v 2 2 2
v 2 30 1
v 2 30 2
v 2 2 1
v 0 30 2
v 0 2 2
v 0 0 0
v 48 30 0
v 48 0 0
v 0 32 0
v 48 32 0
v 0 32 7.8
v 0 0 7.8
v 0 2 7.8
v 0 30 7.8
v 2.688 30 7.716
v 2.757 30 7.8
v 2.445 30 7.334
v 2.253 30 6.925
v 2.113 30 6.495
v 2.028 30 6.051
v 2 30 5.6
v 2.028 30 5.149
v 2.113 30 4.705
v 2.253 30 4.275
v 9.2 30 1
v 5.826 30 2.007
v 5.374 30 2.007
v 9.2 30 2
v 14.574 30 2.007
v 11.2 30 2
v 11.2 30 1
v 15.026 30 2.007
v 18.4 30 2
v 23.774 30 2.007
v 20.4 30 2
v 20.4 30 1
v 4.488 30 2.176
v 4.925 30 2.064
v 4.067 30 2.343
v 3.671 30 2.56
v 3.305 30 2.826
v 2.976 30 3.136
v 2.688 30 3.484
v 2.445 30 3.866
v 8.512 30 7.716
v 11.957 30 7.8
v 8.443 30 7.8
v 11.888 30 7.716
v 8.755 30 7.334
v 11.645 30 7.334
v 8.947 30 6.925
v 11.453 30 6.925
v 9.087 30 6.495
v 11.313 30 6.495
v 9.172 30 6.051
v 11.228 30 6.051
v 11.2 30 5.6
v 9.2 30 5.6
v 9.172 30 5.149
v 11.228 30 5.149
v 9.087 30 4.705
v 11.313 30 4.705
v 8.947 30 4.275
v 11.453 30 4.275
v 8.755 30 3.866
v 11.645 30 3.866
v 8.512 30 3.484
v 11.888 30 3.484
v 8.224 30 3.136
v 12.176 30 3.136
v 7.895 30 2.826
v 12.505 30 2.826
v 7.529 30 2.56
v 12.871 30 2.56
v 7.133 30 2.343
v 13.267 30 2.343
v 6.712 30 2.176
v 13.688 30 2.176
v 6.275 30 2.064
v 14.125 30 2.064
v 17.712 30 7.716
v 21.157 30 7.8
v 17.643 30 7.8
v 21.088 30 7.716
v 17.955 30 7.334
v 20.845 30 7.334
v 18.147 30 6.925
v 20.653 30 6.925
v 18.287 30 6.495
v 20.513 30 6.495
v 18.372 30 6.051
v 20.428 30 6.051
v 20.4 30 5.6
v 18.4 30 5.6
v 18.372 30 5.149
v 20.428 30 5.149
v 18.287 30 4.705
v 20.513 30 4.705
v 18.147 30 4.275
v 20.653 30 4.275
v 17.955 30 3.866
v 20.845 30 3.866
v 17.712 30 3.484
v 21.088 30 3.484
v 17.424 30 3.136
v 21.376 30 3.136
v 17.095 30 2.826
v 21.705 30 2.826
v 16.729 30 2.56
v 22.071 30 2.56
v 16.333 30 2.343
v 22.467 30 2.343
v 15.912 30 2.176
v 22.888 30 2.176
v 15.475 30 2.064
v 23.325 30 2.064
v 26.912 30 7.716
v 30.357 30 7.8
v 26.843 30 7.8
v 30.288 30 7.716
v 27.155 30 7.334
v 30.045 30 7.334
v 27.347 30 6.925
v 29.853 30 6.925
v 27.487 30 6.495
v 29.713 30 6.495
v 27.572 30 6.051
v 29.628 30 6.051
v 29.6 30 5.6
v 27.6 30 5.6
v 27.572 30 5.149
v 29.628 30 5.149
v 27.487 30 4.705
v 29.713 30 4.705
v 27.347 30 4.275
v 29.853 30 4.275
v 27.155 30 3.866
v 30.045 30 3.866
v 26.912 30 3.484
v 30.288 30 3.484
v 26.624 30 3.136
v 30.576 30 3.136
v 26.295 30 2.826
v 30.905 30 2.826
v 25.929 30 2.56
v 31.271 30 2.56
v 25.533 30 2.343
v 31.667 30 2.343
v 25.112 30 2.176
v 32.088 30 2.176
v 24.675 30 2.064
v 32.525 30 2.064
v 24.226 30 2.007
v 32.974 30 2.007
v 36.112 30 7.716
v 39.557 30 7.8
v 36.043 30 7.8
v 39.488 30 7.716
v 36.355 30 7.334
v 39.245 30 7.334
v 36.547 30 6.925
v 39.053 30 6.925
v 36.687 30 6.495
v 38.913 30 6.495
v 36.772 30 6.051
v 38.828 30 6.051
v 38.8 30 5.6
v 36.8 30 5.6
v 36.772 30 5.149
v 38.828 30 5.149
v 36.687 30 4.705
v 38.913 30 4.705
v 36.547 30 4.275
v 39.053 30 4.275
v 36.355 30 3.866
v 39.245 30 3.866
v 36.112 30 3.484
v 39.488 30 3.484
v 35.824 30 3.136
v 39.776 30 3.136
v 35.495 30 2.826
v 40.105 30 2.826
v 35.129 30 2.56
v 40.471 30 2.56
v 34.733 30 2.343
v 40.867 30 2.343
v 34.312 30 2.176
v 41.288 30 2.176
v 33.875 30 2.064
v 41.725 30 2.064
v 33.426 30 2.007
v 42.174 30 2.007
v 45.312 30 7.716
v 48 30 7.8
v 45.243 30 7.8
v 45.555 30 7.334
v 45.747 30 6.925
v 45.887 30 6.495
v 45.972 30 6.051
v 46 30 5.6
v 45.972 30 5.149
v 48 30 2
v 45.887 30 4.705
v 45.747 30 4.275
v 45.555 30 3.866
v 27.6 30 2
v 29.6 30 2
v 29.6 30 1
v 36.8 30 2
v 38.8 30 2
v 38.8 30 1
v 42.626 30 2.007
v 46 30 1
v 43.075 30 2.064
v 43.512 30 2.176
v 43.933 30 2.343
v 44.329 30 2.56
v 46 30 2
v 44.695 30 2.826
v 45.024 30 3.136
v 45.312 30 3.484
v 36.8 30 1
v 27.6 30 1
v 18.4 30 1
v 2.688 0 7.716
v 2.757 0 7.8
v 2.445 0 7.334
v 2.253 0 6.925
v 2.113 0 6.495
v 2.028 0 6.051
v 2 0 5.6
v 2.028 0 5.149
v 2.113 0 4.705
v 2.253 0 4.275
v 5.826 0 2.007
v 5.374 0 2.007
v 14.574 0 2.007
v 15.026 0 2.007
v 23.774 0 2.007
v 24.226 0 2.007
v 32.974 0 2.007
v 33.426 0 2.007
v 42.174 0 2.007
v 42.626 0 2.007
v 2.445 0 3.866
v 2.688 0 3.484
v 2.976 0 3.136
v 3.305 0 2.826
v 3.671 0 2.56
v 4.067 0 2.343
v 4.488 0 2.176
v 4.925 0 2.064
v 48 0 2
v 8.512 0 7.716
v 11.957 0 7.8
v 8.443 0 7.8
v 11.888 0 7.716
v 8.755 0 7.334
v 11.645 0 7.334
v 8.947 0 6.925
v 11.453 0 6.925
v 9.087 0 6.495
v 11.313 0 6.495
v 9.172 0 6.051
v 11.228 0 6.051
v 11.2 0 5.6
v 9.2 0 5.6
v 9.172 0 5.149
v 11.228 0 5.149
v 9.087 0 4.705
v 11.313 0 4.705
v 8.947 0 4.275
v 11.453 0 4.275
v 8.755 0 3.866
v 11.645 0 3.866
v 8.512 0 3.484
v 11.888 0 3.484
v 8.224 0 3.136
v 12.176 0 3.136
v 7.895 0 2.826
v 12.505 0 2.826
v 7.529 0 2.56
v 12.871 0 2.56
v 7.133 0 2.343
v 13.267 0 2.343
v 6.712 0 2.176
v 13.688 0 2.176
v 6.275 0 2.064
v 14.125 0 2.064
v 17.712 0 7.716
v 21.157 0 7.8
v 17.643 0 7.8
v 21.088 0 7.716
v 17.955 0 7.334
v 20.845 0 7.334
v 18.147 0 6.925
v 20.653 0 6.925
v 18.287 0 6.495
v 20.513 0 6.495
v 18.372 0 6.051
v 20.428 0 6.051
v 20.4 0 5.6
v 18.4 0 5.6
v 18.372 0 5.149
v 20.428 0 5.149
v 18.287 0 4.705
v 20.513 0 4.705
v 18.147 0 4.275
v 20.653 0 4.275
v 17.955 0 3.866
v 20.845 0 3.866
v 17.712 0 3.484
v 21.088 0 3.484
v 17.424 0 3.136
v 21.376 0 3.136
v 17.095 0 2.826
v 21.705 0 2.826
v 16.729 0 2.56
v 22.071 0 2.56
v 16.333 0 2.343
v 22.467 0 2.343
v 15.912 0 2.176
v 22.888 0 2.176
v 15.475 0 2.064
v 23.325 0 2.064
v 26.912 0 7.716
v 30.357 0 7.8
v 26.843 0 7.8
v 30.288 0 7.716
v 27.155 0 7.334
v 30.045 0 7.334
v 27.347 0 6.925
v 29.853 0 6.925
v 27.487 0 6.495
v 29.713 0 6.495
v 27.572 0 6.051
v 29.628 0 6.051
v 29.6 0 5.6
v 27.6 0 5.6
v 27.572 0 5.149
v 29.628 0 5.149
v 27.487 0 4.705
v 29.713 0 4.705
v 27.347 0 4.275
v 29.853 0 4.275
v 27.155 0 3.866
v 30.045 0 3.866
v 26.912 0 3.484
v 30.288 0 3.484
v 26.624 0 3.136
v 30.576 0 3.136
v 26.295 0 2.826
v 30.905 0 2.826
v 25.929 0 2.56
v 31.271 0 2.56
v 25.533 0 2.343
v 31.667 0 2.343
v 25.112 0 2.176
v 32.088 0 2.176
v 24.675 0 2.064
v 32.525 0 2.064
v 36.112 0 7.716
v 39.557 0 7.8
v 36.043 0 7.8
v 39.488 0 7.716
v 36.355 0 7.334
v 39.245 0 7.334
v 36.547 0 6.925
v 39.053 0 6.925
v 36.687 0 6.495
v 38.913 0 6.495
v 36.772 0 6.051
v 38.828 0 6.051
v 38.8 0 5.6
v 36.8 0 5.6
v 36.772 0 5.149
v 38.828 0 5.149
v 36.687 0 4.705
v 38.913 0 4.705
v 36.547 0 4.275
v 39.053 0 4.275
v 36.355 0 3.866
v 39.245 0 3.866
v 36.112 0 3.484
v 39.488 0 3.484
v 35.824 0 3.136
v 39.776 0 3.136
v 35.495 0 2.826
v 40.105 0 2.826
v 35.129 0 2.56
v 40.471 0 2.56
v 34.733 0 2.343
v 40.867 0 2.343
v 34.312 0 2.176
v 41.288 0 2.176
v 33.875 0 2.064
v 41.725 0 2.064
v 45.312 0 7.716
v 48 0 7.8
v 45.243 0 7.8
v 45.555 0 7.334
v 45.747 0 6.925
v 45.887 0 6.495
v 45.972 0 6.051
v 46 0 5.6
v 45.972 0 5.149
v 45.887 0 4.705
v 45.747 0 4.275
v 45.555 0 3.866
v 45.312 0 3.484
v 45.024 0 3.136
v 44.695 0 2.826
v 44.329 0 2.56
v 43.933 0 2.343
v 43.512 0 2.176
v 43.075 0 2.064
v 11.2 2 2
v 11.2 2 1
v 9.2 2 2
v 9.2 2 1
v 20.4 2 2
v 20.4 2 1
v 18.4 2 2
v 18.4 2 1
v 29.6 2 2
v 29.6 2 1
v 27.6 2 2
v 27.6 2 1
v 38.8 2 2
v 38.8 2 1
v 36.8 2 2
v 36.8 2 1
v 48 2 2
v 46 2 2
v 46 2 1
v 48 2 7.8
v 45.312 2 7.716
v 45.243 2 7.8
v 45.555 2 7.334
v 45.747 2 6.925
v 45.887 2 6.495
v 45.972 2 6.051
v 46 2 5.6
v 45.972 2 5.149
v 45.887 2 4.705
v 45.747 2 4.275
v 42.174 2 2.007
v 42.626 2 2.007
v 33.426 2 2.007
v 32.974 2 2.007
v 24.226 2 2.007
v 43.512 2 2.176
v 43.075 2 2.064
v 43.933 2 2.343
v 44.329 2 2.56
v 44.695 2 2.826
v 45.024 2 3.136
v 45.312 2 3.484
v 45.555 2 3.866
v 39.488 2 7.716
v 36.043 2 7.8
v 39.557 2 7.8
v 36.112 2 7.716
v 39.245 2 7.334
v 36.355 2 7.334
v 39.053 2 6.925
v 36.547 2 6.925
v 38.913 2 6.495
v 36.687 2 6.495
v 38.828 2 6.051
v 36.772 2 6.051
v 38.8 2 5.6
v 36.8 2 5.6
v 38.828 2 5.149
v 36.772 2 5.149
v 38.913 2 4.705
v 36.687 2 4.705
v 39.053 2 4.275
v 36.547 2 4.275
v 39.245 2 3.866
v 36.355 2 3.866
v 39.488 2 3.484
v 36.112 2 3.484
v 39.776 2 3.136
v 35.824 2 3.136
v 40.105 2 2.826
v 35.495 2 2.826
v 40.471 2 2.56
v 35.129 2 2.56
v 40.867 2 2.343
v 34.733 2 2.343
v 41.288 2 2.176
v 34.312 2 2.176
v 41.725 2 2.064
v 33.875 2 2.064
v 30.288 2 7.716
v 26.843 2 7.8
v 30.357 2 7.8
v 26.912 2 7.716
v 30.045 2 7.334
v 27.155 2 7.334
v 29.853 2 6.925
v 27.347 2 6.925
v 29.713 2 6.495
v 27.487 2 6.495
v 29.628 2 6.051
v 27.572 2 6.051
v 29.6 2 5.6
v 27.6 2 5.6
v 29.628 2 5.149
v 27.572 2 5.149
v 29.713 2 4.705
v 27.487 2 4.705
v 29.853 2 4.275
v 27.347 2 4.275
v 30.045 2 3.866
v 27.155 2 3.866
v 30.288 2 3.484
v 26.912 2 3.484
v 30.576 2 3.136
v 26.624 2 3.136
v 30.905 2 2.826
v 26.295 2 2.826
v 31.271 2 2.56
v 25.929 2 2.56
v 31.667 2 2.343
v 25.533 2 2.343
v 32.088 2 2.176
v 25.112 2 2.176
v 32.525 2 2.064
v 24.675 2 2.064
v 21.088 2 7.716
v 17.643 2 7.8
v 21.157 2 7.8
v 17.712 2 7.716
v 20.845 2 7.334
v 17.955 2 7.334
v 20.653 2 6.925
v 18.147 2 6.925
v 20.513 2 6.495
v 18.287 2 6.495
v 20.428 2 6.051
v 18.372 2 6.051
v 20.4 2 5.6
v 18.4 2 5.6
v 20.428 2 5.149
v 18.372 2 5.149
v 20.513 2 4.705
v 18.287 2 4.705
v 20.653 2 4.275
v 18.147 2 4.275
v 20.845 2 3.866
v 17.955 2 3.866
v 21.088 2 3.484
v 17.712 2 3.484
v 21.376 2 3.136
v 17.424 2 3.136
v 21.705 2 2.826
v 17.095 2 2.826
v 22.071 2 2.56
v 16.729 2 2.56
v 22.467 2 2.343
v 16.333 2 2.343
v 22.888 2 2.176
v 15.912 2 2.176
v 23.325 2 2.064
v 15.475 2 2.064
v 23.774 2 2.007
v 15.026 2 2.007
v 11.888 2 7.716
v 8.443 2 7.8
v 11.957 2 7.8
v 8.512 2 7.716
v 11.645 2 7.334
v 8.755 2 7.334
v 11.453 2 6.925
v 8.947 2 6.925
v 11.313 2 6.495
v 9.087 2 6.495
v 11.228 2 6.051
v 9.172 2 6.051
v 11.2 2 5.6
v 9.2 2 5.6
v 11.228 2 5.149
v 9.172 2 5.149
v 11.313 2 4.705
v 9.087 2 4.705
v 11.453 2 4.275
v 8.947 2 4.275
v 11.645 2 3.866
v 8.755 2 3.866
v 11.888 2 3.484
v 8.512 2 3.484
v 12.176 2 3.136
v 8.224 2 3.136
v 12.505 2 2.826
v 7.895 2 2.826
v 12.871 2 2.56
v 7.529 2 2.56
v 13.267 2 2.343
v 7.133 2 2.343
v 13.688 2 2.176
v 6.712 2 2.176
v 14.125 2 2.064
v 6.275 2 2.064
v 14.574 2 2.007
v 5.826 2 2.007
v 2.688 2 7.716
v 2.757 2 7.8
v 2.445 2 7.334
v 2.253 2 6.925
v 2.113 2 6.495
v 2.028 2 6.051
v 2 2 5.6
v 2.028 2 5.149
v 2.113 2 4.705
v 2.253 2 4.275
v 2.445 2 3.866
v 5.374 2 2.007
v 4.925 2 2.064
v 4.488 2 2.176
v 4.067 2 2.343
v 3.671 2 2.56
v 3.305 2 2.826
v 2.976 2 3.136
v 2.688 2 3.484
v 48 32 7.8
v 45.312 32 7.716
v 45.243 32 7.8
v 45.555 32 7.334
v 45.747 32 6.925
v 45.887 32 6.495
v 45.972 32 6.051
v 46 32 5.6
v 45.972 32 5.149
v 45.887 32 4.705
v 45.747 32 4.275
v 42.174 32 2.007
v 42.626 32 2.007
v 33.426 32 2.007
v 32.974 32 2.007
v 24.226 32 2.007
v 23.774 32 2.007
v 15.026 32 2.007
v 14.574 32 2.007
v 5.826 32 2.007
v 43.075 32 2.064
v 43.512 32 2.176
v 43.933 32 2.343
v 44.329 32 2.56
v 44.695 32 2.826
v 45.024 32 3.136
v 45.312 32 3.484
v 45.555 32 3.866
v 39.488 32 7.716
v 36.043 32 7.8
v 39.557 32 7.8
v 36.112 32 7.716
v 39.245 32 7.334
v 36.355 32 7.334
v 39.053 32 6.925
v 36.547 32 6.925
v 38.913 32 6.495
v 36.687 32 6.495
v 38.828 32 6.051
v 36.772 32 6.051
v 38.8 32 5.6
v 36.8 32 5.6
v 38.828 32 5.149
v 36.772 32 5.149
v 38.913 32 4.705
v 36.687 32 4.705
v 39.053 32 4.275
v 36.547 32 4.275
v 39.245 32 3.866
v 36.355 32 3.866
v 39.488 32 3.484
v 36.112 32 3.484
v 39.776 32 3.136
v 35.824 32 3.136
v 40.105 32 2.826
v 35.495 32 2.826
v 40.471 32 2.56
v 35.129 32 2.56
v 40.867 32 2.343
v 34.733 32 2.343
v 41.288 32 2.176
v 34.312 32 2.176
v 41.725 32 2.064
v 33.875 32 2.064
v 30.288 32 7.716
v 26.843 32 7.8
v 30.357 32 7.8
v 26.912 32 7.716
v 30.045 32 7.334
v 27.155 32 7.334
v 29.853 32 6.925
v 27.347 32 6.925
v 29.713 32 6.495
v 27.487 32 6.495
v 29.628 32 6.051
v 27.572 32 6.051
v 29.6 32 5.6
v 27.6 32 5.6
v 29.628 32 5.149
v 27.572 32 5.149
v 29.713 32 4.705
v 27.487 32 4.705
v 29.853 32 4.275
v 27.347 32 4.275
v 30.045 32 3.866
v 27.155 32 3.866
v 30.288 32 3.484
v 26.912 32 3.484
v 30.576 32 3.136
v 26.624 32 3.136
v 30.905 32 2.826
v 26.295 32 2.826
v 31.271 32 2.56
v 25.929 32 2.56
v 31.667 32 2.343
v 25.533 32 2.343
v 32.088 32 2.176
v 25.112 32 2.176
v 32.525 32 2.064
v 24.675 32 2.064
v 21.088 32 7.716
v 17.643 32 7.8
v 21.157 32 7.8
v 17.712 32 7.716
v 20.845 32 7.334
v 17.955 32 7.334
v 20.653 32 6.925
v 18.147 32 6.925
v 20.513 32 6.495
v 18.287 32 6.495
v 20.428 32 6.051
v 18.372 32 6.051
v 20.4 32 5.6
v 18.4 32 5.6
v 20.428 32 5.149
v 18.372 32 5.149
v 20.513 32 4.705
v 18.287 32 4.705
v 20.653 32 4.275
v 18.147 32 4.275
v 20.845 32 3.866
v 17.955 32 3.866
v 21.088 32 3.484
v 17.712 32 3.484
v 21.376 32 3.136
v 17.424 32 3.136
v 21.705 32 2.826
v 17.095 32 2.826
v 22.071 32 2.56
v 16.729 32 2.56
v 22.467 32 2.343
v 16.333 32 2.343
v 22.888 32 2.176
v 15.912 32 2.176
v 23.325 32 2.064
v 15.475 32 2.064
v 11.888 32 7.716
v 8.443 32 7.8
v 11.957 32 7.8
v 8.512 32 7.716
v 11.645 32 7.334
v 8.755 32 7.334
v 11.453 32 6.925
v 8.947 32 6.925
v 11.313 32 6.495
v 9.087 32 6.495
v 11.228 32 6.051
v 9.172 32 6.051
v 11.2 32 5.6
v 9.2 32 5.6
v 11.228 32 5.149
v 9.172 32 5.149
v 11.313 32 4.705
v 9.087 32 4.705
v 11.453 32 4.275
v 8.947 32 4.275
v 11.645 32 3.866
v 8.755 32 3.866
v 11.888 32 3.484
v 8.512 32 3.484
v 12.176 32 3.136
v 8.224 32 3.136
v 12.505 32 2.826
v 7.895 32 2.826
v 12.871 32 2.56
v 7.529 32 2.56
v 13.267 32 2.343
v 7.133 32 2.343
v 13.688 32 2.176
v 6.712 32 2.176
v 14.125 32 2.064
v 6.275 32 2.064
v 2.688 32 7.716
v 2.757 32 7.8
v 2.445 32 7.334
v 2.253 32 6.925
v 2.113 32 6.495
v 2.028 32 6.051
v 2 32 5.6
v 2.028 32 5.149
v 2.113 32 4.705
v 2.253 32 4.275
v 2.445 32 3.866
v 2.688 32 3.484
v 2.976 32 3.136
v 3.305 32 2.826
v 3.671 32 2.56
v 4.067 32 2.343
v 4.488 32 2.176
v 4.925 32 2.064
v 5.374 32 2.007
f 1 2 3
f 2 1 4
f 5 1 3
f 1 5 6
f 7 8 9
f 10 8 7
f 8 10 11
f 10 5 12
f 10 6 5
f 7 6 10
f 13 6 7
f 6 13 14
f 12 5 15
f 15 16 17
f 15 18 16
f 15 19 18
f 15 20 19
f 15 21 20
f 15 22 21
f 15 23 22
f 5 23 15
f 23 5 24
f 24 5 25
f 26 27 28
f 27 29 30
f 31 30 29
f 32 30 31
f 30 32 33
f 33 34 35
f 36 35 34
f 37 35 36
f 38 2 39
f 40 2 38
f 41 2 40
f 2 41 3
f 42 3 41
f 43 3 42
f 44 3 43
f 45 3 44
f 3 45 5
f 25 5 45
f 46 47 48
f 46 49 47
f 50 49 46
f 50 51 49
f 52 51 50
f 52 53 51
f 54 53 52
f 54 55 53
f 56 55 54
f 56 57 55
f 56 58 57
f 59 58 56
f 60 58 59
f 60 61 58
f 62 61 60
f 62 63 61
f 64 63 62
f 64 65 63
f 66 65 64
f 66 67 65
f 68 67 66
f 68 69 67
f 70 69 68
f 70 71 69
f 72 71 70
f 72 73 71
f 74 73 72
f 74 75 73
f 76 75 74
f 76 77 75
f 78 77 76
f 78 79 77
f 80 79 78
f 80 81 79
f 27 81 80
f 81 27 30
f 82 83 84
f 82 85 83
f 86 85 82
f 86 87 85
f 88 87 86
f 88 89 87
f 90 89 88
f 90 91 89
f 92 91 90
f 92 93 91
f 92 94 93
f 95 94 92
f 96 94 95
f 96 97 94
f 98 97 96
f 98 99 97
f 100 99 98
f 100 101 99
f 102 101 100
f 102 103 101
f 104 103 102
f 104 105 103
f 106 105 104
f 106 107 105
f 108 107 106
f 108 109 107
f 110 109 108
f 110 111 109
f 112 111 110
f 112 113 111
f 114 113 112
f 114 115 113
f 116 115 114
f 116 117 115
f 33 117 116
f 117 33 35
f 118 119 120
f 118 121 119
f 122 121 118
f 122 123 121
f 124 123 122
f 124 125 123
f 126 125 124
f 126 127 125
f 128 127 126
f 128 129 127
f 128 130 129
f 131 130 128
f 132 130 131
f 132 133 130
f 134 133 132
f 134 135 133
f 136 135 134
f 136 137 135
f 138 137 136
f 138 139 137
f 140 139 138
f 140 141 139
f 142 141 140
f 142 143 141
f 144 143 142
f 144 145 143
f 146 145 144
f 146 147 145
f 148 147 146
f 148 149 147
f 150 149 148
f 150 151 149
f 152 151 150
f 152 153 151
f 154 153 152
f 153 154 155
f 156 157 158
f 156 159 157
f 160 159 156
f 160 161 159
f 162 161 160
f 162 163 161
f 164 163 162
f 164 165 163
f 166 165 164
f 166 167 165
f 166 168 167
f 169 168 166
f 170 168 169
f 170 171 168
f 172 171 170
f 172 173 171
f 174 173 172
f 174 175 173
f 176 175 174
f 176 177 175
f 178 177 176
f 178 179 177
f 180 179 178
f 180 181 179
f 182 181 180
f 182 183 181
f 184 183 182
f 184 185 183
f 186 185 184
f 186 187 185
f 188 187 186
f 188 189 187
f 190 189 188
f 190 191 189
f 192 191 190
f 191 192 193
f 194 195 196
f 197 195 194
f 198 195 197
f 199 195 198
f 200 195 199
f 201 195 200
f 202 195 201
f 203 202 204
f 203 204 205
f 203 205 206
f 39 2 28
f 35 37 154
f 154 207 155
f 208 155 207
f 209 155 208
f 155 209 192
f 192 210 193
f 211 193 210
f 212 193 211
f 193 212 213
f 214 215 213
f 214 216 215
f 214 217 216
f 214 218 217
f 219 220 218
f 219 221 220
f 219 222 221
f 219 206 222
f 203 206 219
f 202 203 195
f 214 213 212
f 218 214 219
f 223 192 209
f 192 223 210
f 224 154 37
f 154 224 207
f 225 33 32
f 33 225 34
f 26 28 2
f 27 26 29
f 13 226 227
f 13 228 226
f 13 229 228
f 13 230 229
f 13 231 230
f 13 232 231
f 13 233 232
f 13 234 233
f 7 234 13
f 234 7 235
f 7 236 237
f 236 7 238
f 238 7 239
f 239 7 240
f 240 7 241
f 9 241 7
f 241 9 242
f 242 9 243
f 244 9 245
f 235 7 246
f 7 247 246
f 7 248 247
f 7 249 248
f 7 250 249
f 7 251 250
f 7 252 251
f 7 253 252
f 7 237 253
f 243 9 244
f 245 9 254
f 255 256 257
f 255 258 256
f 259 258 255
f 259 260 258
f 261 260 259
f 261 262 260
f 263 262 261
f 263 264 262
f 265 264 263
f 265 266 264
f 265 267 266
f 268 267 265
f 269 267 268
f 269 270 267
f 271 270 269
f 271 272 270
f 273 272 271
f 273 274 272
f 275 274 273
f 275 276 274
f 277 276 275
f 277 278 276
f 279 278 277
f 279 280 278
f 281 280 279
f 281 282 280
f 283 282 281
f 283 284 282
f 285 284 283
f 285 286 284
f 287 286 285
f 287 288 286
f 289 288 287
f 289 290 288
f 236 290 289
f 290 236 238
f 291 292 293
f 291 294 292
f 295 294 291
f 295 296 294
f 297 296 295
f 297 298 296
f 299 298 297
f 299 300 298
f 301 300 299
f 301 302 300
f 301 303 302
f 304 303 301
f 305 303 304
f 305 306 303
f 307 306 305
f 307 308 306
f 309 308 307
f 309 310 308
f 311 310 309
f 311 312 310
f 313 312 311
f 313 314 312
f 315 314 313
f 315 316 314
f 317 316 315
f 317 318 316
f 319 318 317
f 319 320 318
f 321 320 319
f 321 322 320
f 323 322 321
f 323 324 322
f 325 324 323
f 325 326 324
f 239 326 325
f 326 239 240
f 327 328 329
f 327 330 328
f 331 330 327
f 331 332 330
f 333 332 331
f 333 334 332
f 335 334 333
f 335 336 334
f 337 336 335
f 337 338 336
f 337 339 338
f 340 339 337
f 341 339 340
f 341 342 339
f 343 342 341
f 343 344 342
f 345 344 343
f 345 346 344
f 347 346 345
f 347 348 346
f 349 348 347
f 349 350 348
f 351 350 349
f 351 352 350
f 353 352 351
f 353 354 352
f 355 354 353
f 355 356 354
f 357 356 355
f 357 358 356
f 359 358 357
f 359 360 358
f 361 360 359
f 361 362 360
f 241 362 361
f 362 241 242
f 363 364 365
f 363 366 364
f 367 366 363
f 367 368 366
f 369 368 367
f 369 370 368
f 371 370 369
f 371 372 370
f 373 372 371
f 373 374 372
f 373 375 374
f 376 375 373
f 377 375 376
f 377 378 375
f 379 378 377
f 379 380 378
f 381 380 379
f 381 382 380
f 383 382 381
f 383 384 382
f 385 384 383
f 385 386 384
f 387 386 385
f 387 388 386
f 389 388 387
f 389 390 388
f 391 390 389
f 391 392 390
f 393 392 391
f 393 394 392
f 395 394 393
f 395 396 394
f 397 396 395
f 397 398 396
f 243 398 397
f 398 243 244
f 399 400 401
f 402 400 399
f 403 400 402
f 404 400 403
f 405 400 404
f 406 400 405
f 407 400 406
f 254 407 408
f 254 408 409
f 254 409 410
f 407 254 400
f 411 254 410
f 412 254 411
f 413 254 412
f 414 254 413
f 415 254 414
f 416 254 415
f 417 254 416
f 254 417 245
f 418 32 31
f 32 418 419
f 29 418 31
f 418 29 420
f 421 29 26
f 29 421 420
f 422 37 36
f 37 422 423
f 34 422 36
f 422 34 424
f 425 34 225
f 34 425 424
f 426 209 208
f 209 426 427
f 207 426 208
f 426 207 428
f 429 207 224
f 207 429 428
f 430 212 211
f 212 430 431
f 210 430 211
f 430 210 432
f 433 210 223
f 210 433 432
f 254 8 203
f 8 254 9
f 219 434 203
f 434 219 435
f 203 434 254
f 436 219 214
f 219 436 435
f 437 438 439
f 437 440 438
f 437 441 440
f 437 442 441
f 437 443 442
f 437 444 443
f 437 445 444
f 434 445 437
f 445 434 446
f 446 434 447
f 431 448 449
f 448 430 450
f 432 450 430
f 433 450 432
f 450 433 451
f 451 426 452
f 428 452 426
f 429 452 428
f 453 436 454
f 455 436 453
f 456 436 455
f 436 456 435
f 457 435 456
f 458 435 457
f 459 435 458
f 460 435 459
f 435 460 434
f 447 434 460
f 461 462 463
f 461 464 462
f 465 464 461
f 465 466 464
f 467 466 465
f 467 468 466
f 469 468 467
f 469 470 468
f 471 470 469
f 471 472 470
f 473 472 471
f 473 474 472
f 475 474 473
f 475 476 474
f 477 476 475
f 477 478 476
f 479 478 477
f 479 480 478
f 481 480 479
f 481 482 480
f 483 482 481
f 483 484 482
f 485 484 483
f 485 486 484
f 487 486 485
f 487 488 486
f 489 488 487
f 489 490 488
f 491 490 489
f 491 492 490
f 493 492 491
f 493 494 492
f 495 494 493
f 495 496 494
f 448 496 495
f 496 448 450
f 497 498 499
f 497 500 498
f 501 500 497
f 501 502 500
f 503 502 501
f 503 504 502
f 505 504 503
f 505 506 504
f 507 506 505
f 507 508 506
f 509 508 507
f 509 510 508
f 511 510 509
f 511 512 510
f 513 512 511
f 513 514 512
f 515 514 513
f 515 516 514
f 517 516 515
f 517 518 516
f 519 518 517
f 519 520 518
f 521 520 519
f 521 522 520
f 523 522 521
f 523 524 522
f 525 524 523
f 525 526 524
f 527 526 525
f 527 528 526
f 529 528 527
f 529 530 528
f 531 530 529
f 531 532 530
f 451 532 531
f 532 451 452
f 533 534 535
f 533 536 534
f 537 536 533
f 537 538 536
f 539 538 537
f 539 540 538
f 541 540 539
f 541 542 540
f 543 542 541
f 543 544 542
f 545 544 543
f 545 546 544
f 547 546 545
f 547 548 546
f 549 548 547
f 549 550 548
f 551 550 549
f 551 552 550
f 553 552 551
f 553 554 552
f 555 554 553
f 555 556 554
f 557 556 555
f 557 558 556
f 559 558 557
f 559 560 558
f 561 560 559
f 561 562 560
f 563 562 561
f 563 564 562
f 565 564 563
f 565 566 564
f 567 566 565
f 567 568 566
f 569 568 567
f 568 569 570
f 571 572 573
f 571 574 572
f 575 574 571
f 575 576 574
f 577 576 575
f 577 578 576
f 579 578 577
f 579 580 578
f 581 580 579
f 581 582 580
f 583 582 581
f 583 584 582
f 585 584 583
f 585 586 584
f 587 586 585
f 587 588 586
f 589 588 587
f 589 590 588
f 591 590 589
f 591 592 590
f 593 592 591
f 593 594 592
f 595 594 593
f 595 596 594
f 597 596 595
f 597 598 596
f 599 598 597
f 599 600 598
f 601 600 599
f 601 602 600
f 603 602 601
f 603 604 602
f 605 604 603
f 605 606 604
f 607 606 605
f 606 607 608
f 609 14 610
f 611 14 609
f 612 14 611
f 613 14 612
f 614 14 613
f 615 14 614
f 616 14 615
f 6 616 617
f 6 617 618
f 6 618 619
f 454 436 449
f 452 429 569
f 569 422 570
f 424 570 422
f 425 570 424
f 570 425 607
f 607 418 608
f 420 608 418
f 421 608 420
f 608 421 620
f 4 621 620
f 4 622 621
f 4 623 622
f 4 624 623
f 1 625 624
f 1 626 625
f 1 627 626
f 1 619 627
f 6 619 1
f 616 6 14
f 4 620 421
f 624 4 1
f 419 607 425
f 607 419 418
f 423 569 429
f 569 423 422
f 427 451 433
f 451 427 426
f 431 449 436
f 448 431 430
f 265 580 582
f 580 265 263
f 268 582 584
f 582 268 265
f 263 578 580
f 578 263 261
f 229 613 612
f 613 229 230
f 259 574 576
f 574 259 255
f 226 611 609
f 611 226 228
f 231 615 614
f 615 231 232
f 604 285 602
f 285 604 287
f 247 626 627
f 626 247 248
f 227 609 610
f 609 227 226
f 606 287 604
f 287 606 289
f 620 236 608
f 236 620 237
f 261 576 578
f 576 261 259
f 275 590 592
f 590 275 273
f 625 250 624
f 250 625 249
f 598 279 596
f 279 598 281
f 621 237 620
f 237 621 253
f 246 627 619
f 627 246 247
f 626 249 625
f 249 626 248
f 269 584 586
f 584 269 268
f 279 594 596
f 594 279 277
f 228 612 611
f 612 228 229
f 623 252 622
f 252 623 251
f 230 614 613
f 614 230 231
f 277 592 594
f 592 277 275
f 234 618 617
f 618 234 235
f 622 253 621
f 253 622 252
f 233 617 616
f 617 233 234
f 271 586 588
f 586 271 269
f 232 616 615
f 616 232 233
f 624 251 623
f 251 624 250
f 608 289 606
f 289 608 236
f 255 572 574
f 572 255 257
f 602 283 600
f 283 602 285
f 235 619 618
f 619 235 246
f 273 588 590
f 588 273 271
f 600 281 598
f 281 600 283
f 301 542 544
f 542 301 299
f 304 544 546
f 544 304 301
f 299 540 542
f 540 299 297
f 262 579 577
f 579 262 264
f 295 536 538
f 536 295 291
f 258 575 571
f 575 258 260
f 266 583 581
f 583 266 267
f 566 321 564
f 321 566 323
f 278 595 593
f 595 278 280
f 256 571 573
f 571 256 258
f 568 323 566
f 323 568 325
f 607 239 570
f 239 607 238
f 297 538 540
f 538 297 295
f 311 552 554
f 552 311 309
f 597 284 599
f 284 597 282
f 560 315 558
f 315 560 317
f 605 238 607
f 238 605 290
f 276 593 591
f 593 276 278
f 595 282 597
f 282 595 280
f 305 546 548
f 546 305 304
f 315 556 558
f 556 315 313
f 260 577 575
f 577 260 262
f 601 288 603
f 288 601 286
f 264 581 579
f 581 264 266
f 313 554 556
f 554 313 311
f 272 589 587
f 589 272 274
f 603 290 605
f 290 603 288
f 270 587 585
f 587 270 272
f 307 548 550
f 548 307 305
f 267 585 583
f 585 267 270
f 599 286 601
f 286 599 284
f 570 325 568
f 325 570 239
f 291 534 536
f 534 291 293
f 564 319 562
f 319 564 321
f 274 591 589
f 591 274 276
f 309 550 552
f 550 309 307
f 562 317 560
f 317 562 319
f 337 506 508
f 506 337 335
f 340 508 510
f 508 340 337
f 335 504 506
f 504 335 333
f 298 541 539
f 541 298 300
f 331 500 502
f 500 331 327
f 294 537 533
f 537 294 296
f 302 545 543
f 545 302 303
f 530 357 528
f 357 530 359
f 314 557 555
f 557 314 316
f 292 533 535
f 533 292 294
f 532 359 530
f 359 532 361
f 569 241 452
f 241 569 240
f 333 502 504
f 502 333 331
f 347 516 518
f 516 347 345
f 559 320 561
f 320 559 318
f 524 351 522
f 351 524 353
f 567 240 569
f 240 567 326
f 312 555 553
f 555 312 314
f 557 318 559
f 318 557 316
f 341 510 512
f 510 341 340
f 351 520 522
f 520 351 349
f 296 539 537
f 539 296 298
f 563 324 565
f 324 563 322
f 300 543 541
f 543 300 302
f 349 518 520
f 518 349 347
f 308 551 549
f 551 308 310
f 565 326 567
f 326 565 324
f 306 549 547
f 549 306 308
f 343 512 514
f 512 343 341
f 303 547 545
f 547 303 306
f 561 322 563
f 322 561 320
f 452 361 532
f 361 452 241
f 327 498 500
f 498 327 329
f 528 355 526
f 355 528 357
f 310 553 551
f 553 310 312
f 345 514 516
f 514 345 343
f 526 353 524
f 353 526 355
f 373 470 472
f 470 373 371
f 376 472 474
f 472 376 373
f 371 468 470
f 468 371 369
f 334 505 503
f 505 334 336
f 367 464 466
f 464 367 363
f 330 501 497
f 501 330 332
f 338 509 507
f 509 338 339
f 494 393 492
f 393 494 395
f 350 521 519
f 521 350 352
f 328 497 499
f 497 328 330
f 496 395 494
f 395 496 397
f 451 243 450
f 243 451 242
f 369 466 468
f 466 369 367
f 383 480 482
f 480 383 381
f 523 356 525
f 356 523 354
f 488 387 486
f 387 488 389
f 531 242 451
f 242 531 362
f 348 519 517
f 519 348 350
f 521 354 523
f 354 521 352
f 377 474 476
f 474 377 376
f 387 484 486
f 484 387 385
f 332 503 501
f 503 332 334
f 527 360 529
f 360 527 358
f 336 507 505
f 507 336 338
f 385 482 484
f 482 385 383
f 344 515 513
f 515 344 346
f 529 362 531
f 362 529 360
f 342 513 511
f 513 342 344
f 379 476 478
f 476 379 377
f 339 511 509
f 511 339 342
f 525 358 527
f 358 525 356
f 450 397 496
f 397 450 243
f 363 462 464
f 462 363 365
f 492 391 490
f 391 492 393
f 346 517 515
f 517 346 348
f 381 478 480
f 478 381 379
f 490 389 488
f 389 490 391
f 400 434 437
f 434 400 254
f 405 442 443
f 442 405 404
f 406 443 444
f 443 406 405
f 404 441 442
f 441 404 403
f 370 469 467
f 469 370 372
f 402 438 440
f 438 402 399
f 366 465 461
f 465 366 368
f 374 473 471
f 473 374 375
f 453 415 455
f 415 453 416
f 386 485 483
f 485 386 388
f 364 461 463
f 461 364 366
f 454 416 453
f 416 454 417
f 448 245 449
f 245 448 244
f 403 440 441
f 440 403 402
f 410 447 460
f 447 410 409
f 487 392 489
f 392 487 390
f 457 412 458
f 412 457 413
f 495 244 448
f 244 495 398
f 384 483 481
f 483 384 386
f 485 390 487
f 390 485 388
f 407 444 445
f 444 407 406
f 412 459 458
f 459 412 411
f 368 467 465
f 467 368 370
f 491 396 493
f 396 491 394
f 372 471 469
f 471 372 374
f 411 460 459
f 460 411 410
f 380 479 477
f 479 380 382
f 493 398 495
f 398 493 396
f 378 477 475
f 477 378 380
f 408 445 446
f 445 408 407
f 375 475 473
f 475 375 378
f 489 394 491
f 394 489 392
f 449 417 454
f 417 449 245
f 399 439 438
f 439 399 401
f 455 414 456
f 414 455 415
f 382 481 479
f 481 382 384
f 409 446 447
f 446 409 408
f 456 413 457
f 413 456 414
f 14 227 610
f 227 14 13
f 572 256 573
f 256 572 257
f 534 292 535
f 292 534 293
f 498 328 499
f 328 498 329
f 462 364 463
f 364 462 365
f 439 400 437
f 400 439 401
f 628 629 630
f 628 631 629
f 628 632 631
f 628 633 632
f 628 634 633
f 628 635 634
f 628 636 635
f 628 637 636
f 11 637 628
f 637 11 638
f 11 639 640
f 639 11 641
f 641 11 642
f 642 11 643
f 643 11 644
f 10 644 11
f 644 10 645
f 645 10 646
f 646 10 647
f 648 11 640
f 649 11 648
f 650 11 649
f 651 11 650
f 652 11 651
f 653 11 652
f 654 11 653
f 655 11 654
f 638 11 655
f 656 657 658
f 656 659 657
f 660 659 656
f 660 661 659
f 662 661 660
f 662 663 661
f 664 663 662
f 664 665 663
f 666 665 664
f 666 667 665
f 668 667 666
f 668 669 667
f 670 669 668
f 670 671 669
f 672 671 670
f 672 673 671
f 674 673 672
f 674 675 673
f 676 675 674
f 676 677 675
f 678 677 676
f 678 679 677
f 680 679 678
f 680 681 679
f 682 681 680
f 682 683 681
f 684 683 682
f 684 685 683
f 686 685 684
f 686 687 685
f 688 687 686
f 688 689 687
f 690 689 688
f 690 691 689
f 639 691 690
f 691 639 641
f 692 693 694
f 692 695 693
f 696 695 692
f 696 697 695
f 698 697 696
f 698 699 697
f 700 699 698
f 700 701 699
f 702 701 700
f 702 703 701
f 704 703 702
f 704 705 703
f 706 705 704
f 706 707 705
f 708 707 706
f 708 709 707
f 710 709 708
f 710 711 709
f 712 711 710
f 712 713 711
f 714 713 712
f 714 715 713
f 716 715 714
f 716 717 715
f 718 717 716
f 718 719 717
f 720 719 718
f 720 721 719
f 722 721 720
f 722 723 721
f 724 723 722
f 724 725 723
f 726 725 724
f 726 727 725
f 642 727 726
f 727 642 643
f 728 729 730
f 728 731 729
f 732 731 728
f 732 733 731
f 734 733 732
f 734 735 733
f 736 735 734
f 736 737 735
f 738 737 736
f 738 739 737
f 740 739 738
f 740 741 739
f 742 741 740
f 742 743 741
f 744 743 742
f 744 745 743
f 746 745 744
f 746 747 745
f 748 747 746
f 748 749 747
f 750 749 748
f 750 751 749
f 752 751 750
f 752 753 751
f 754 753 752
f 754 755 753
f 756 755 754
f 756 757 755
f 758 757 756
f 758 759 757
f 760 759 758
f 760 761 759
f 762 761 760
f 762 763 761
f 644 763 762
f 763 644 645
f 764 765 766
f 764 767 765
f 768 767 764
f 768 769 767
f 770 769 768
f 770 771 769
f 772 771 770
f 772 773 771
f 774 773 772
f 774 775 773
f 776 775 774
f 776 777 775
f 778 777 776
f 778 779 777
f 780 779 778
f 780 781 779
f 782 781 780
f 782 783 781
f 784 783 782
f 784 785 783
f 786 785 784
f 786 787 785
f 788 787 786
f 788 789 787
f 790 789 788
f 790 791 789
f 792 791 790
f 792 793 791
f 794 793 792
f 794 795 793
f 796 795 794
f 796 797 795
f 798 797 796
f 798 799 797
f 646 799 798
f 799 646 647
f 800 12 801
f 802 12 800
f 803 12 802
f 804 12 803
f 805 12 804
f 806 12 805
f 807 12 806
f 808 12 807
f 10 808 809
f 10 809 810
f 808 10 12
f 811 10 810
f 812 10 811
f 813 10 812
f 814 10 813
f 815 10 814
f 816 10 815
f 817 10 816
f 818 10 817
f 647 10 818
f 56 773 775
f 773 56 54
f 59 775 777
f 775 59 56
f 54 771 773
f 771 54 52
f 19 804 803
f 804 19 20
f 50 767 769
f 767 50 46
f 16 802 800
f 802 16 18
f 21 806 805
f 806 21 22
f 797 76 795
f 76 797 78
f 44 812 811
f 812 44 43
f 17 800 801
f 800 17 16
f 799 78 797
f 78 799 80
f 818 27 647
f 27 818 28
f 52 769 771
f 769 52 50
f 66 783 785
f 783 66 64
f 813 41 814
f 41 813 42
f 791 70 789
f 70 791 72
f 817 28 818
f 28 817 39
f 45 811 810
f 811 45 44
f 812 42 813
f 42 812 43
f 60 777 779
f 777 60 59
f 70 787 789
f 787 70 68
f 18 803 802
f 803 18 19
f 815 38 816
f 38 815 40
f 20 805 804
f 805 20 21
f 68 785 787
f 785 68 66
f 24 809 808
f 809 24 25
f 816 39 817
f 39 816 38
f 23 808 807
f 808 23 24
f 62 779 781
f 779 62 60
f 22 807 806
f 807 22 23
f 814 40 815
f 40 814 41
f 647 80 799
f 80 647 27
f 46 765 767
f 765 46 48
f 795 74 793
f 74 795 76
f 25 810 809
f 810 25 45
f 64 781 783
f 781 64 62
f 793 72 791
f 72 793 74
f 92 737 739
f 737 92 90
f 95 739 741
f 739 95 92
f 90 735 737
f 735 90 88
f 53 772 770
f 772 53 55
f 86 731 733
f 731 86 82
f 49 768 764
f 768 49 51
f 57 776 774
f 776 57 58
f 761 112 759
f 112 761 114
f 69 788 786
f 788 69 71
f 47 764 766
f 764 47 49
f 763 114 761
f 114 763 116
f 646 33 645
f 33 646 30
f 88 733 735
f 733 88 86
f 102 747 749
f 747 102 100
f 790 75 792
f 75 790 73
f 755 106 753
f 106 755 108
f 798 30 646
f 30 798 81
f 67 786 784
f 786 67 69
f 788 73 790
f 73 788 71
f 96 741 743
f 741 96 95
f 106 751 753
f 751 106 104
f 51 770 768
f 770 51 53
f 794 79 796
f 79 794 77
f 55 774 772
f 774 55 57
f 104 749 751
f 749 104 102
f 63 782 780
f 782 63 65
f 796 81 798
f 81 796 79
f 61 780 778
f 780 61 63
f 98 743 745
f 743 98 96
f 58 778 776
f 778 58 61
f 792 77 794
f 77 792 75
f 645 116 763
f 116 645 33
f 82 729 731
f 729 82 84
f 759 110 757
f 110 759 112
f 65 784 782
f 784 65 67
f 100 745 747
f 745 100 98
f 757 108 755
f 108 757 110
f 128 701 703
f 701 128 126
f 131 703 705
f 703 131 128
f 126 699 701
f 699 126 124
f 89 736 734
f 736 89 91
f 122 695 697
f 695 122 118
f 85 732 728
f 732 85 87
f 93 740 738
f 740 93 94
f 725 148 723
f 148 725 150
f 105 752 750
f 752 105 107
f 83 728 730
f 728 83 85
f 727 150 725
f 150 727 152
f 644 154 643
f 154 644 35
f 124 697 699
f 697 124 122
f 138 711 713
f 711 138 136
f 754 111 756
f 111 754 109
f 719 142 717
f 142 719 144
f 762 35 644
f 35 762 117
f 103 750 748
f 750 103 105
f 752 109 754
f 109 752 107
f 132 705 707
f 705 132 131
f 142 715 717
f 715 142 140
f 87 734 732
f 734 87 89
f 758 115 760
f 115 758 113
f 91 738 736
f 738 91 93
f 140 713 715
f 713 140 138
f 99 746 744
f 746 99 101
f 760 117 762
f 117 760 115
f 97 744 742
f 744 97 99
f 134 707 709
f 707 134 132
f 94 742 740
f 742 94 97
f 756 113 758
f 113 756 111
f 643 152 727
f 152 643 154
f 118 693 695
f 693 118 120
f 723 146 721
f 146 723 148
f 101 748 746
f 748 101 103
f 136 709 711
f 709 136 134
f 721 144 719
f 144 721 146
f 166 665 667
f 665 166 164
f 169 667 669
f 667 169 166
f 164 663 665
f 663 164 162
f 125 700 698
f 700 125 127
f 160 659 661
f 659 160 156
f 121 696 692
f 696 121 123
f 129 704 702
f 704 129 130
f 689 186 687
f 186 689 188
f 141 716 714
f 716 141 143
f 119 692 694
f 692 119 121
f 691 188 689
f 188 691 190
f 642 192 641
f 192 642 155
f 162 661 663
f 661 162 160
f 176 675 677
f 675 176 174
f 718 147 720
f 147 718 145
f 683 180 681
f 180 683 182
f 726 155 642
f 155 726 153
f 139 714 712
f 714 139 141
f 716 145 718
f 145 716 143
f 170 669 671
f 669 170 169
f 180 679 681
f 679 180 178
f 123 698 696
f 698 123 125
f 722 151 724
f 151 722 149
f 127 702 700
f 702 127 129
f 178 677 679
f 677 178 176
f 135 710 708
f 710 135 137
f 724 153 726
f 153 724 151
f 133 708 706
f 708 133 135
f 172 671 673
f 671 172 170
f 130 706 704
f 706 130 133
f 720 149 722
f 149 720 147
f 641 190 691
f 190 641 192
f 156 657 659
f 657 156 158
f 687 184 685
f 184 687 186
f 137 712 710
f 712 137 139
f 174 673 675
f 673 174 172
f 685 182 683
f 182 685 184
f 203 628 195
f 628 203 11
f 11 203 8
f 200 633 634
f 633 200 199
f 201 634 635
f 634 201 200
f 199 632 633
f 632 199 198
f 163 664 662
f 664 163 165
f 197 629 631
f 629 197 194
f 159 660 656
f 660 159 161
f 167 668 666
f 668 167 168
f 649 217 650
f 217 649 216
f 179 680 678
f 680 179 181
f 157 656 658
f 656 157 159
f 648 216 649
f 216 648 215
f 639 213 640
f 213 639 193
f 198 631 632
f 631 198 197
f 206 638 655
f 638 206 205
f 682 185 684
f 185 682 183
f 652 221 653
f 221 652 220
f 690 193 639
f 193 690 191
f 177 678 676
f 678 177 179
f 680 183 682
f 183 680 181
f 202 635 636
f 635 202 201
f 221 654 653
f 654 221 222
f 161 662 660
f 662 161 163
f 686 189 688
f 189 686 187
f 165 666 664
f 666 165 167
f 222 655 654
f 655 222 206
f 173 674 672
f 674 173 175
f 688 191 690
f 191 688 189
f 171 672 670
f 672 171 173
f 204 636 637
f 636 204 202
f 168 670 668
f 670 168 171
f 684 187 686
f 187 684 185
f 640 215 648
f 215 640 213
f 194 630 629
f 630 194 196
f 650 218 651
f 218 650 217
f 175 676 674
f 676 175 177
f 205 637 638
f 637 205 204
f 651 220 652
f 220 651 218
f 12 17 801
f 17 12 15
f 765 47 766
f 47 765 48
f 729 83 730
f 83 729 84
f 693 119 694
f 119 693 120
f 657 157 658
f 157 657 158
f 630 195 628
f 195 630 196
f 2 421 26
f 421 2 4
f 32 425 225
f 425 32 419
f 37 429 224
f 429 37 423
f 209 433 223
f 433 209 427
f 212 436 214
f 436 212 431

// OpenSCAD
// Clip for holding five LAMY T10 ink cartridges (https://www.lamy.com/en-us/p/lamy-t-10-ink/50727869088078)

cart_r = 7.2 / 2;

wall_thicc = 2;

$fn=50;

clip_width = cart_r * 2 + wall_thicc * 2;

module clip() {
    difference() {
        cube([clip_width, wall_thicc, clip_width]);
        translate([cart_r + wall_thicc, 5, cart_r + wall_thicc])
            rotate([90, 0, 0])
            cylinder(10, cart_r, cart_r);
    }
}

function comb_width() = clip_width * 4 + wall_thicc;

module comb() {
    difference() {
        union() {
            for (i = [0:4]) {
                translate([i * (clip_width - wall_thicc), 0, 0])
                    clip();
            }
        }
        translate([-clip_width / 2 + wall_thicc, -wall_thicc / 2, clip_width - 3.4])
            cube([clip_width * 6, wall_thicc * 2, clip_width]);
    }
}

union() {
    for (i = [0:5]) {
        translate([i * (clip_width - wall_thicc), 0, 0])
            cube([wall_thicc, 30, wall_thicc]);
    }
    cube([comb_width(), 30, 1]);
    comb();
    translate([0, 30, 0]) comb();
}
